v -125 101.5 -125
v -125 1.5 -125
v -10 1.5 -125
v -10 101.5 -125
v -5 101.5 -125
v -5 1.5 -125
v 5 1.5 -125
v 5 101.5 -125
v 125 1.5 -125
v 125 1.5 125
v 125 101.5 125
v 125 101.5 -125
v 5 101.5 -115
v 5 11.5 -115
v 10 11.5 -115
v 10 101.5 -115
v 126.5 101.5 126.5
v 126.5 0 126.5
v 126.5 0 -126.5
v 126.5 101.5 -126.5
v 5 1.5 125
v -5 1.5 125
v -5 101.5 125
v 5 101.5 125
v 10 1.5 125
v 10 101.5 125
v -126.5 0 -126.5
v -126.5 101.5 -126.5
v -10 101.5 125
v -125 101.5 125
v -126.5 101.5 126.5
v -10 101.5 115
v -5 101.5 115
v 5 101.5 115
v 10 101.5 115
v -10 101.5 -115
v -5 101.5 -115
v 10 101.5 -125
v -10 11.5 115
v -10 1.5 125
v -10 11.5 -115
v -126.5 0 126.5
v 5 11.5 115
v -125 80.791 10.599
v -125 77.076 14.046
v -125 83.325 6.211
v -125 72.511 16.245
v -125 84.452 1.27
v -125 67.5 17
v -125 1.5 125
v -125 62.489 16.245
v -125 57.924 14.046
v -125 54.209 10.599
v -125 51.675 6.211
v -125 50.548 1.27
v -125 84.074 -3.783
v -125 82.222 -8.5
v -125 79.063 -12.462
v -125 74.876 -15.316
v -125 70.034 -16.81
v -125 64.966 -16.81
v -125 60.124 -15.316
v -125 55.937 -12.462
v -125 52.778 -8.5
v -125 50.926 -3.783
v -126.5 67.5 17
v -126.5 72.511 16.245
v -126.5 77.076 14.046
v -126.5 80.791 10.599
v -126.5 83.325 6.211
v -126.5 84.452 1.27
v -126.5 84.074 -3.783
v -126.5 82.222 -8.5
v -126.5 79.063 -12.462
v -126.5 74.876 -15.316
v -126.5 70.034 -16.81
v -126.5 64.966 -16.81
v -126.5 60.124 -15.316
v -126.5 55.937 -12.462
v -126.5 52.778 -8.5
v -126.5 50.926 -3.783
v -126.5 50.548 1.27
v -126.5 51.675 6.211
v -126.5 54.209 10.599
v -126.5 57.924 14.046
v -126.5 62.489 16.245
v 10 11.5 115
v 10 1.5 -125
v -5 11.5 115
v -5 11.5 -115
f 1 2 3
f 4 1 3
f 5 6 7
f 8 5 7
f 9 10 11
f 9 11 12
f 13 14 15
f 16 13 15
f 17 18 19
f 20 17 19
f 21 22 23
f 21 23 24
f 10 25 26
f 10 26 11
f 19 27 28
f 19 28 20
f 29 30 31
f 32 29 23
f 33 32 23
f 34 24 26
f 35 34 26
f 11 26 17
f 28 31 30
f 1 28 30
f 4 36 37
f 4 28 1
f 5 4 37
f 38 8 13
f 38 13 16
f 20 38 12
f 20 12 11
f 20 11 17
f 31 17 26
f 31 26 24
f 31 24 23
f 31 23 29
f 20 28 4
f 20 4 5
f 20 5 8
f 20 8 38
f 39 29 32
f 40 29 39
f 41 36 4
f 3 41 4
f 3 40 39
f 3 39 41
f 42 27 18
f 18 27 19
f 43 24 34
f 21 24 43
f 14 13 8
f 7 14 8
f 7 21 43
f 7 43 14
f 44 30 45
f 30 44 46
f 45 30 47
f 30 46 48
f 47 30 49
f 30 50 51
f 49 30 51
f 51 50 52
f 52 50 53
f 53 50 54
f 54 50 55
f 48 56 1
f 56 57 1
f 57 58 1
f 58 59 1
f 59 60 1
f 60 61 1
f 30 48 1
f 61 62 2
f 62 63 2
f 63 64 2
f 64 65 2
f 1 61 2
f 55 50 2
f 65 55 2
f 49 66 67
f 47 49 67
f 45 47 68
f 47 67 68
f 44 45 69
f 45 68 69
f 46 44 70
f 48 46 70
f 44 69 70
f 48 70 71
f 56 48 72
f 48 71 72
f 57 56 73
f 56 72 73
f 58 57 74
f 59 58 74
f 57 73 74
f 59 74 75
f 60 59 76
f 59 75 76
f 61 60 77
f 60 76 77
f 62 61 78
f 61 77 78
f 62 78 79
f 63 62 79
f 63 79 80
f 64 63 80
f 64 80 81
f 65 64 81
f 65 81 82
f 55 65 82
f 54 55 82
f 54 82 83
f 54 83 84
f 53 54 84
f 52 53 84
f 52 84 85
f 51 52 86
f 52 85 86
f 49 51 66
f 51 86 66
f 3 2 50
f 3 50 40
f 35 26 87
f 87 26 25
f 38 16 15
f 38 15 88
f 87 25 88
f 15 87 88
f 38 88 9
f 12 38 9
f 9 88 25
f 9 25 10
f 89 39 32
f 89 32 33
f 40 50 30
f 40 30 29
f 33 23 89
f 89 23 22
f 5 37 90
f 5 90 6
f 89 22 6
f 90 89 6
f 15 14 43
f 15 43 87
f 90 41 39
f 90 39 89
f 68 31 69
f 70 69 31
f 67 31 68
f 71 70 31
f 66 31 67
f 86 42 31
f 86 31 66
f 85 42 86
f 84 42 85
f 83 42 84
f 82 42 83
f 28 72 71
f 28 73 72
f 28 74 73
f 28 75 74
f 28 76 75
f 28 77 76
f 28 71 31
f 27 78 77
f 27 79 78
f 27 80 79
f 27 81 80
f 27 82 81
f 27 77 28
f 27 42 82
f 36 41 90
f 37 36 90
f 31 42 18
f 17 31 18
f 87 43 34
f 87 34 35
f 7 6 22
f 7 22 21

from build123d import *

# Parameters (mm, degrees)
SKETCH1_W           = 253
SKETCH1_H           = 253
BOSS_EXTRUDE1_DEPTH = 101.5
SHELL2_T            = -1.5
SKETCH2_W           = 5
SKETCH2_H           = 230
BOSS_EXTRUDE3_DEPTH = 10
SKETCH3_W           = 5
SKETCH3_H           = 10
BOSS_EXTRUDE4_DEPTH = 100
SKETCH4_R           = 17
CUT_EXTRUDE1_DEPTH  = 1.5


with BuildPart() as part:
    # Sketch1 → Boss-Extrude1 (new body)
    with BuildSketch(Plane(origin=(0, 0, 0), x_dir=(1, 0, 0), z_dir=(0, 1, 0))):
        Rectangle(SKETCH1_W, SKETCH1_H)
    extrude(amount=BOSS_EXTRUDE1_DEPTH)

    # Shell2
    shell2_openings = [part.faces().sort_by_distance(p)[0] for p in [
        (0, 101.5, 0),
    ]]
    offset(amount=SHELL2_T, openings=shell2_openings, kind=Kind.INTERSECTION)

    # Sketch2 → Boss-Extrude3 (add)
    with BuildSketch(Plane(origin=(0, 1.5, 0), x_dir=(1, 0, 0), z_dir=(0, 1, 0))):
        with Locations((-7.5, 0)):
            Rectangle(SKETCH2_W, SKETCH2_H)
        with Locations((7.5, 0)):
            Rectangle(SKETCH2_W, SKETCH2_H)
    extrude(amount=BOSS_EXTRUDE3_DEPTH)

    # Sketch3 → Boss-Extrude4 (add)
    with BuildSketch(Plane(origin=(0, 1.5, 0), x_dir=(1, 0, 0), z_dir=(0, 1, 0))):
        with Locations((-7.5, 120)):
            Rectangle(SKETCH3_W, SKETCH3_H)
        with Locations((7.5, 120)):
            Rectangle(SKETCH3_W, SKETCH3_H)
        with Locations((7.5, -120)):
            Rectangle(SKETCH3_W, SKETCH3_H)
        with Locations((-7.5, -120)):
            Rectangle(SKETCH3_W, SKETCH3_H)
    extrude(amount=BOSS_EXTRUDE4_DEPTH)

    # Sketch4 → Cut-Extrude1 (cut)
    with BuildSketch(Plane.ZY.offset(126.5)):
        with Locations((0, 67.5)):
            Circle(SKETCH4_R)
    extrude(amount=-CUT_EXTRUDE1_DEPTH, mode=Mode.SUBTRACT)


solid = part.part
